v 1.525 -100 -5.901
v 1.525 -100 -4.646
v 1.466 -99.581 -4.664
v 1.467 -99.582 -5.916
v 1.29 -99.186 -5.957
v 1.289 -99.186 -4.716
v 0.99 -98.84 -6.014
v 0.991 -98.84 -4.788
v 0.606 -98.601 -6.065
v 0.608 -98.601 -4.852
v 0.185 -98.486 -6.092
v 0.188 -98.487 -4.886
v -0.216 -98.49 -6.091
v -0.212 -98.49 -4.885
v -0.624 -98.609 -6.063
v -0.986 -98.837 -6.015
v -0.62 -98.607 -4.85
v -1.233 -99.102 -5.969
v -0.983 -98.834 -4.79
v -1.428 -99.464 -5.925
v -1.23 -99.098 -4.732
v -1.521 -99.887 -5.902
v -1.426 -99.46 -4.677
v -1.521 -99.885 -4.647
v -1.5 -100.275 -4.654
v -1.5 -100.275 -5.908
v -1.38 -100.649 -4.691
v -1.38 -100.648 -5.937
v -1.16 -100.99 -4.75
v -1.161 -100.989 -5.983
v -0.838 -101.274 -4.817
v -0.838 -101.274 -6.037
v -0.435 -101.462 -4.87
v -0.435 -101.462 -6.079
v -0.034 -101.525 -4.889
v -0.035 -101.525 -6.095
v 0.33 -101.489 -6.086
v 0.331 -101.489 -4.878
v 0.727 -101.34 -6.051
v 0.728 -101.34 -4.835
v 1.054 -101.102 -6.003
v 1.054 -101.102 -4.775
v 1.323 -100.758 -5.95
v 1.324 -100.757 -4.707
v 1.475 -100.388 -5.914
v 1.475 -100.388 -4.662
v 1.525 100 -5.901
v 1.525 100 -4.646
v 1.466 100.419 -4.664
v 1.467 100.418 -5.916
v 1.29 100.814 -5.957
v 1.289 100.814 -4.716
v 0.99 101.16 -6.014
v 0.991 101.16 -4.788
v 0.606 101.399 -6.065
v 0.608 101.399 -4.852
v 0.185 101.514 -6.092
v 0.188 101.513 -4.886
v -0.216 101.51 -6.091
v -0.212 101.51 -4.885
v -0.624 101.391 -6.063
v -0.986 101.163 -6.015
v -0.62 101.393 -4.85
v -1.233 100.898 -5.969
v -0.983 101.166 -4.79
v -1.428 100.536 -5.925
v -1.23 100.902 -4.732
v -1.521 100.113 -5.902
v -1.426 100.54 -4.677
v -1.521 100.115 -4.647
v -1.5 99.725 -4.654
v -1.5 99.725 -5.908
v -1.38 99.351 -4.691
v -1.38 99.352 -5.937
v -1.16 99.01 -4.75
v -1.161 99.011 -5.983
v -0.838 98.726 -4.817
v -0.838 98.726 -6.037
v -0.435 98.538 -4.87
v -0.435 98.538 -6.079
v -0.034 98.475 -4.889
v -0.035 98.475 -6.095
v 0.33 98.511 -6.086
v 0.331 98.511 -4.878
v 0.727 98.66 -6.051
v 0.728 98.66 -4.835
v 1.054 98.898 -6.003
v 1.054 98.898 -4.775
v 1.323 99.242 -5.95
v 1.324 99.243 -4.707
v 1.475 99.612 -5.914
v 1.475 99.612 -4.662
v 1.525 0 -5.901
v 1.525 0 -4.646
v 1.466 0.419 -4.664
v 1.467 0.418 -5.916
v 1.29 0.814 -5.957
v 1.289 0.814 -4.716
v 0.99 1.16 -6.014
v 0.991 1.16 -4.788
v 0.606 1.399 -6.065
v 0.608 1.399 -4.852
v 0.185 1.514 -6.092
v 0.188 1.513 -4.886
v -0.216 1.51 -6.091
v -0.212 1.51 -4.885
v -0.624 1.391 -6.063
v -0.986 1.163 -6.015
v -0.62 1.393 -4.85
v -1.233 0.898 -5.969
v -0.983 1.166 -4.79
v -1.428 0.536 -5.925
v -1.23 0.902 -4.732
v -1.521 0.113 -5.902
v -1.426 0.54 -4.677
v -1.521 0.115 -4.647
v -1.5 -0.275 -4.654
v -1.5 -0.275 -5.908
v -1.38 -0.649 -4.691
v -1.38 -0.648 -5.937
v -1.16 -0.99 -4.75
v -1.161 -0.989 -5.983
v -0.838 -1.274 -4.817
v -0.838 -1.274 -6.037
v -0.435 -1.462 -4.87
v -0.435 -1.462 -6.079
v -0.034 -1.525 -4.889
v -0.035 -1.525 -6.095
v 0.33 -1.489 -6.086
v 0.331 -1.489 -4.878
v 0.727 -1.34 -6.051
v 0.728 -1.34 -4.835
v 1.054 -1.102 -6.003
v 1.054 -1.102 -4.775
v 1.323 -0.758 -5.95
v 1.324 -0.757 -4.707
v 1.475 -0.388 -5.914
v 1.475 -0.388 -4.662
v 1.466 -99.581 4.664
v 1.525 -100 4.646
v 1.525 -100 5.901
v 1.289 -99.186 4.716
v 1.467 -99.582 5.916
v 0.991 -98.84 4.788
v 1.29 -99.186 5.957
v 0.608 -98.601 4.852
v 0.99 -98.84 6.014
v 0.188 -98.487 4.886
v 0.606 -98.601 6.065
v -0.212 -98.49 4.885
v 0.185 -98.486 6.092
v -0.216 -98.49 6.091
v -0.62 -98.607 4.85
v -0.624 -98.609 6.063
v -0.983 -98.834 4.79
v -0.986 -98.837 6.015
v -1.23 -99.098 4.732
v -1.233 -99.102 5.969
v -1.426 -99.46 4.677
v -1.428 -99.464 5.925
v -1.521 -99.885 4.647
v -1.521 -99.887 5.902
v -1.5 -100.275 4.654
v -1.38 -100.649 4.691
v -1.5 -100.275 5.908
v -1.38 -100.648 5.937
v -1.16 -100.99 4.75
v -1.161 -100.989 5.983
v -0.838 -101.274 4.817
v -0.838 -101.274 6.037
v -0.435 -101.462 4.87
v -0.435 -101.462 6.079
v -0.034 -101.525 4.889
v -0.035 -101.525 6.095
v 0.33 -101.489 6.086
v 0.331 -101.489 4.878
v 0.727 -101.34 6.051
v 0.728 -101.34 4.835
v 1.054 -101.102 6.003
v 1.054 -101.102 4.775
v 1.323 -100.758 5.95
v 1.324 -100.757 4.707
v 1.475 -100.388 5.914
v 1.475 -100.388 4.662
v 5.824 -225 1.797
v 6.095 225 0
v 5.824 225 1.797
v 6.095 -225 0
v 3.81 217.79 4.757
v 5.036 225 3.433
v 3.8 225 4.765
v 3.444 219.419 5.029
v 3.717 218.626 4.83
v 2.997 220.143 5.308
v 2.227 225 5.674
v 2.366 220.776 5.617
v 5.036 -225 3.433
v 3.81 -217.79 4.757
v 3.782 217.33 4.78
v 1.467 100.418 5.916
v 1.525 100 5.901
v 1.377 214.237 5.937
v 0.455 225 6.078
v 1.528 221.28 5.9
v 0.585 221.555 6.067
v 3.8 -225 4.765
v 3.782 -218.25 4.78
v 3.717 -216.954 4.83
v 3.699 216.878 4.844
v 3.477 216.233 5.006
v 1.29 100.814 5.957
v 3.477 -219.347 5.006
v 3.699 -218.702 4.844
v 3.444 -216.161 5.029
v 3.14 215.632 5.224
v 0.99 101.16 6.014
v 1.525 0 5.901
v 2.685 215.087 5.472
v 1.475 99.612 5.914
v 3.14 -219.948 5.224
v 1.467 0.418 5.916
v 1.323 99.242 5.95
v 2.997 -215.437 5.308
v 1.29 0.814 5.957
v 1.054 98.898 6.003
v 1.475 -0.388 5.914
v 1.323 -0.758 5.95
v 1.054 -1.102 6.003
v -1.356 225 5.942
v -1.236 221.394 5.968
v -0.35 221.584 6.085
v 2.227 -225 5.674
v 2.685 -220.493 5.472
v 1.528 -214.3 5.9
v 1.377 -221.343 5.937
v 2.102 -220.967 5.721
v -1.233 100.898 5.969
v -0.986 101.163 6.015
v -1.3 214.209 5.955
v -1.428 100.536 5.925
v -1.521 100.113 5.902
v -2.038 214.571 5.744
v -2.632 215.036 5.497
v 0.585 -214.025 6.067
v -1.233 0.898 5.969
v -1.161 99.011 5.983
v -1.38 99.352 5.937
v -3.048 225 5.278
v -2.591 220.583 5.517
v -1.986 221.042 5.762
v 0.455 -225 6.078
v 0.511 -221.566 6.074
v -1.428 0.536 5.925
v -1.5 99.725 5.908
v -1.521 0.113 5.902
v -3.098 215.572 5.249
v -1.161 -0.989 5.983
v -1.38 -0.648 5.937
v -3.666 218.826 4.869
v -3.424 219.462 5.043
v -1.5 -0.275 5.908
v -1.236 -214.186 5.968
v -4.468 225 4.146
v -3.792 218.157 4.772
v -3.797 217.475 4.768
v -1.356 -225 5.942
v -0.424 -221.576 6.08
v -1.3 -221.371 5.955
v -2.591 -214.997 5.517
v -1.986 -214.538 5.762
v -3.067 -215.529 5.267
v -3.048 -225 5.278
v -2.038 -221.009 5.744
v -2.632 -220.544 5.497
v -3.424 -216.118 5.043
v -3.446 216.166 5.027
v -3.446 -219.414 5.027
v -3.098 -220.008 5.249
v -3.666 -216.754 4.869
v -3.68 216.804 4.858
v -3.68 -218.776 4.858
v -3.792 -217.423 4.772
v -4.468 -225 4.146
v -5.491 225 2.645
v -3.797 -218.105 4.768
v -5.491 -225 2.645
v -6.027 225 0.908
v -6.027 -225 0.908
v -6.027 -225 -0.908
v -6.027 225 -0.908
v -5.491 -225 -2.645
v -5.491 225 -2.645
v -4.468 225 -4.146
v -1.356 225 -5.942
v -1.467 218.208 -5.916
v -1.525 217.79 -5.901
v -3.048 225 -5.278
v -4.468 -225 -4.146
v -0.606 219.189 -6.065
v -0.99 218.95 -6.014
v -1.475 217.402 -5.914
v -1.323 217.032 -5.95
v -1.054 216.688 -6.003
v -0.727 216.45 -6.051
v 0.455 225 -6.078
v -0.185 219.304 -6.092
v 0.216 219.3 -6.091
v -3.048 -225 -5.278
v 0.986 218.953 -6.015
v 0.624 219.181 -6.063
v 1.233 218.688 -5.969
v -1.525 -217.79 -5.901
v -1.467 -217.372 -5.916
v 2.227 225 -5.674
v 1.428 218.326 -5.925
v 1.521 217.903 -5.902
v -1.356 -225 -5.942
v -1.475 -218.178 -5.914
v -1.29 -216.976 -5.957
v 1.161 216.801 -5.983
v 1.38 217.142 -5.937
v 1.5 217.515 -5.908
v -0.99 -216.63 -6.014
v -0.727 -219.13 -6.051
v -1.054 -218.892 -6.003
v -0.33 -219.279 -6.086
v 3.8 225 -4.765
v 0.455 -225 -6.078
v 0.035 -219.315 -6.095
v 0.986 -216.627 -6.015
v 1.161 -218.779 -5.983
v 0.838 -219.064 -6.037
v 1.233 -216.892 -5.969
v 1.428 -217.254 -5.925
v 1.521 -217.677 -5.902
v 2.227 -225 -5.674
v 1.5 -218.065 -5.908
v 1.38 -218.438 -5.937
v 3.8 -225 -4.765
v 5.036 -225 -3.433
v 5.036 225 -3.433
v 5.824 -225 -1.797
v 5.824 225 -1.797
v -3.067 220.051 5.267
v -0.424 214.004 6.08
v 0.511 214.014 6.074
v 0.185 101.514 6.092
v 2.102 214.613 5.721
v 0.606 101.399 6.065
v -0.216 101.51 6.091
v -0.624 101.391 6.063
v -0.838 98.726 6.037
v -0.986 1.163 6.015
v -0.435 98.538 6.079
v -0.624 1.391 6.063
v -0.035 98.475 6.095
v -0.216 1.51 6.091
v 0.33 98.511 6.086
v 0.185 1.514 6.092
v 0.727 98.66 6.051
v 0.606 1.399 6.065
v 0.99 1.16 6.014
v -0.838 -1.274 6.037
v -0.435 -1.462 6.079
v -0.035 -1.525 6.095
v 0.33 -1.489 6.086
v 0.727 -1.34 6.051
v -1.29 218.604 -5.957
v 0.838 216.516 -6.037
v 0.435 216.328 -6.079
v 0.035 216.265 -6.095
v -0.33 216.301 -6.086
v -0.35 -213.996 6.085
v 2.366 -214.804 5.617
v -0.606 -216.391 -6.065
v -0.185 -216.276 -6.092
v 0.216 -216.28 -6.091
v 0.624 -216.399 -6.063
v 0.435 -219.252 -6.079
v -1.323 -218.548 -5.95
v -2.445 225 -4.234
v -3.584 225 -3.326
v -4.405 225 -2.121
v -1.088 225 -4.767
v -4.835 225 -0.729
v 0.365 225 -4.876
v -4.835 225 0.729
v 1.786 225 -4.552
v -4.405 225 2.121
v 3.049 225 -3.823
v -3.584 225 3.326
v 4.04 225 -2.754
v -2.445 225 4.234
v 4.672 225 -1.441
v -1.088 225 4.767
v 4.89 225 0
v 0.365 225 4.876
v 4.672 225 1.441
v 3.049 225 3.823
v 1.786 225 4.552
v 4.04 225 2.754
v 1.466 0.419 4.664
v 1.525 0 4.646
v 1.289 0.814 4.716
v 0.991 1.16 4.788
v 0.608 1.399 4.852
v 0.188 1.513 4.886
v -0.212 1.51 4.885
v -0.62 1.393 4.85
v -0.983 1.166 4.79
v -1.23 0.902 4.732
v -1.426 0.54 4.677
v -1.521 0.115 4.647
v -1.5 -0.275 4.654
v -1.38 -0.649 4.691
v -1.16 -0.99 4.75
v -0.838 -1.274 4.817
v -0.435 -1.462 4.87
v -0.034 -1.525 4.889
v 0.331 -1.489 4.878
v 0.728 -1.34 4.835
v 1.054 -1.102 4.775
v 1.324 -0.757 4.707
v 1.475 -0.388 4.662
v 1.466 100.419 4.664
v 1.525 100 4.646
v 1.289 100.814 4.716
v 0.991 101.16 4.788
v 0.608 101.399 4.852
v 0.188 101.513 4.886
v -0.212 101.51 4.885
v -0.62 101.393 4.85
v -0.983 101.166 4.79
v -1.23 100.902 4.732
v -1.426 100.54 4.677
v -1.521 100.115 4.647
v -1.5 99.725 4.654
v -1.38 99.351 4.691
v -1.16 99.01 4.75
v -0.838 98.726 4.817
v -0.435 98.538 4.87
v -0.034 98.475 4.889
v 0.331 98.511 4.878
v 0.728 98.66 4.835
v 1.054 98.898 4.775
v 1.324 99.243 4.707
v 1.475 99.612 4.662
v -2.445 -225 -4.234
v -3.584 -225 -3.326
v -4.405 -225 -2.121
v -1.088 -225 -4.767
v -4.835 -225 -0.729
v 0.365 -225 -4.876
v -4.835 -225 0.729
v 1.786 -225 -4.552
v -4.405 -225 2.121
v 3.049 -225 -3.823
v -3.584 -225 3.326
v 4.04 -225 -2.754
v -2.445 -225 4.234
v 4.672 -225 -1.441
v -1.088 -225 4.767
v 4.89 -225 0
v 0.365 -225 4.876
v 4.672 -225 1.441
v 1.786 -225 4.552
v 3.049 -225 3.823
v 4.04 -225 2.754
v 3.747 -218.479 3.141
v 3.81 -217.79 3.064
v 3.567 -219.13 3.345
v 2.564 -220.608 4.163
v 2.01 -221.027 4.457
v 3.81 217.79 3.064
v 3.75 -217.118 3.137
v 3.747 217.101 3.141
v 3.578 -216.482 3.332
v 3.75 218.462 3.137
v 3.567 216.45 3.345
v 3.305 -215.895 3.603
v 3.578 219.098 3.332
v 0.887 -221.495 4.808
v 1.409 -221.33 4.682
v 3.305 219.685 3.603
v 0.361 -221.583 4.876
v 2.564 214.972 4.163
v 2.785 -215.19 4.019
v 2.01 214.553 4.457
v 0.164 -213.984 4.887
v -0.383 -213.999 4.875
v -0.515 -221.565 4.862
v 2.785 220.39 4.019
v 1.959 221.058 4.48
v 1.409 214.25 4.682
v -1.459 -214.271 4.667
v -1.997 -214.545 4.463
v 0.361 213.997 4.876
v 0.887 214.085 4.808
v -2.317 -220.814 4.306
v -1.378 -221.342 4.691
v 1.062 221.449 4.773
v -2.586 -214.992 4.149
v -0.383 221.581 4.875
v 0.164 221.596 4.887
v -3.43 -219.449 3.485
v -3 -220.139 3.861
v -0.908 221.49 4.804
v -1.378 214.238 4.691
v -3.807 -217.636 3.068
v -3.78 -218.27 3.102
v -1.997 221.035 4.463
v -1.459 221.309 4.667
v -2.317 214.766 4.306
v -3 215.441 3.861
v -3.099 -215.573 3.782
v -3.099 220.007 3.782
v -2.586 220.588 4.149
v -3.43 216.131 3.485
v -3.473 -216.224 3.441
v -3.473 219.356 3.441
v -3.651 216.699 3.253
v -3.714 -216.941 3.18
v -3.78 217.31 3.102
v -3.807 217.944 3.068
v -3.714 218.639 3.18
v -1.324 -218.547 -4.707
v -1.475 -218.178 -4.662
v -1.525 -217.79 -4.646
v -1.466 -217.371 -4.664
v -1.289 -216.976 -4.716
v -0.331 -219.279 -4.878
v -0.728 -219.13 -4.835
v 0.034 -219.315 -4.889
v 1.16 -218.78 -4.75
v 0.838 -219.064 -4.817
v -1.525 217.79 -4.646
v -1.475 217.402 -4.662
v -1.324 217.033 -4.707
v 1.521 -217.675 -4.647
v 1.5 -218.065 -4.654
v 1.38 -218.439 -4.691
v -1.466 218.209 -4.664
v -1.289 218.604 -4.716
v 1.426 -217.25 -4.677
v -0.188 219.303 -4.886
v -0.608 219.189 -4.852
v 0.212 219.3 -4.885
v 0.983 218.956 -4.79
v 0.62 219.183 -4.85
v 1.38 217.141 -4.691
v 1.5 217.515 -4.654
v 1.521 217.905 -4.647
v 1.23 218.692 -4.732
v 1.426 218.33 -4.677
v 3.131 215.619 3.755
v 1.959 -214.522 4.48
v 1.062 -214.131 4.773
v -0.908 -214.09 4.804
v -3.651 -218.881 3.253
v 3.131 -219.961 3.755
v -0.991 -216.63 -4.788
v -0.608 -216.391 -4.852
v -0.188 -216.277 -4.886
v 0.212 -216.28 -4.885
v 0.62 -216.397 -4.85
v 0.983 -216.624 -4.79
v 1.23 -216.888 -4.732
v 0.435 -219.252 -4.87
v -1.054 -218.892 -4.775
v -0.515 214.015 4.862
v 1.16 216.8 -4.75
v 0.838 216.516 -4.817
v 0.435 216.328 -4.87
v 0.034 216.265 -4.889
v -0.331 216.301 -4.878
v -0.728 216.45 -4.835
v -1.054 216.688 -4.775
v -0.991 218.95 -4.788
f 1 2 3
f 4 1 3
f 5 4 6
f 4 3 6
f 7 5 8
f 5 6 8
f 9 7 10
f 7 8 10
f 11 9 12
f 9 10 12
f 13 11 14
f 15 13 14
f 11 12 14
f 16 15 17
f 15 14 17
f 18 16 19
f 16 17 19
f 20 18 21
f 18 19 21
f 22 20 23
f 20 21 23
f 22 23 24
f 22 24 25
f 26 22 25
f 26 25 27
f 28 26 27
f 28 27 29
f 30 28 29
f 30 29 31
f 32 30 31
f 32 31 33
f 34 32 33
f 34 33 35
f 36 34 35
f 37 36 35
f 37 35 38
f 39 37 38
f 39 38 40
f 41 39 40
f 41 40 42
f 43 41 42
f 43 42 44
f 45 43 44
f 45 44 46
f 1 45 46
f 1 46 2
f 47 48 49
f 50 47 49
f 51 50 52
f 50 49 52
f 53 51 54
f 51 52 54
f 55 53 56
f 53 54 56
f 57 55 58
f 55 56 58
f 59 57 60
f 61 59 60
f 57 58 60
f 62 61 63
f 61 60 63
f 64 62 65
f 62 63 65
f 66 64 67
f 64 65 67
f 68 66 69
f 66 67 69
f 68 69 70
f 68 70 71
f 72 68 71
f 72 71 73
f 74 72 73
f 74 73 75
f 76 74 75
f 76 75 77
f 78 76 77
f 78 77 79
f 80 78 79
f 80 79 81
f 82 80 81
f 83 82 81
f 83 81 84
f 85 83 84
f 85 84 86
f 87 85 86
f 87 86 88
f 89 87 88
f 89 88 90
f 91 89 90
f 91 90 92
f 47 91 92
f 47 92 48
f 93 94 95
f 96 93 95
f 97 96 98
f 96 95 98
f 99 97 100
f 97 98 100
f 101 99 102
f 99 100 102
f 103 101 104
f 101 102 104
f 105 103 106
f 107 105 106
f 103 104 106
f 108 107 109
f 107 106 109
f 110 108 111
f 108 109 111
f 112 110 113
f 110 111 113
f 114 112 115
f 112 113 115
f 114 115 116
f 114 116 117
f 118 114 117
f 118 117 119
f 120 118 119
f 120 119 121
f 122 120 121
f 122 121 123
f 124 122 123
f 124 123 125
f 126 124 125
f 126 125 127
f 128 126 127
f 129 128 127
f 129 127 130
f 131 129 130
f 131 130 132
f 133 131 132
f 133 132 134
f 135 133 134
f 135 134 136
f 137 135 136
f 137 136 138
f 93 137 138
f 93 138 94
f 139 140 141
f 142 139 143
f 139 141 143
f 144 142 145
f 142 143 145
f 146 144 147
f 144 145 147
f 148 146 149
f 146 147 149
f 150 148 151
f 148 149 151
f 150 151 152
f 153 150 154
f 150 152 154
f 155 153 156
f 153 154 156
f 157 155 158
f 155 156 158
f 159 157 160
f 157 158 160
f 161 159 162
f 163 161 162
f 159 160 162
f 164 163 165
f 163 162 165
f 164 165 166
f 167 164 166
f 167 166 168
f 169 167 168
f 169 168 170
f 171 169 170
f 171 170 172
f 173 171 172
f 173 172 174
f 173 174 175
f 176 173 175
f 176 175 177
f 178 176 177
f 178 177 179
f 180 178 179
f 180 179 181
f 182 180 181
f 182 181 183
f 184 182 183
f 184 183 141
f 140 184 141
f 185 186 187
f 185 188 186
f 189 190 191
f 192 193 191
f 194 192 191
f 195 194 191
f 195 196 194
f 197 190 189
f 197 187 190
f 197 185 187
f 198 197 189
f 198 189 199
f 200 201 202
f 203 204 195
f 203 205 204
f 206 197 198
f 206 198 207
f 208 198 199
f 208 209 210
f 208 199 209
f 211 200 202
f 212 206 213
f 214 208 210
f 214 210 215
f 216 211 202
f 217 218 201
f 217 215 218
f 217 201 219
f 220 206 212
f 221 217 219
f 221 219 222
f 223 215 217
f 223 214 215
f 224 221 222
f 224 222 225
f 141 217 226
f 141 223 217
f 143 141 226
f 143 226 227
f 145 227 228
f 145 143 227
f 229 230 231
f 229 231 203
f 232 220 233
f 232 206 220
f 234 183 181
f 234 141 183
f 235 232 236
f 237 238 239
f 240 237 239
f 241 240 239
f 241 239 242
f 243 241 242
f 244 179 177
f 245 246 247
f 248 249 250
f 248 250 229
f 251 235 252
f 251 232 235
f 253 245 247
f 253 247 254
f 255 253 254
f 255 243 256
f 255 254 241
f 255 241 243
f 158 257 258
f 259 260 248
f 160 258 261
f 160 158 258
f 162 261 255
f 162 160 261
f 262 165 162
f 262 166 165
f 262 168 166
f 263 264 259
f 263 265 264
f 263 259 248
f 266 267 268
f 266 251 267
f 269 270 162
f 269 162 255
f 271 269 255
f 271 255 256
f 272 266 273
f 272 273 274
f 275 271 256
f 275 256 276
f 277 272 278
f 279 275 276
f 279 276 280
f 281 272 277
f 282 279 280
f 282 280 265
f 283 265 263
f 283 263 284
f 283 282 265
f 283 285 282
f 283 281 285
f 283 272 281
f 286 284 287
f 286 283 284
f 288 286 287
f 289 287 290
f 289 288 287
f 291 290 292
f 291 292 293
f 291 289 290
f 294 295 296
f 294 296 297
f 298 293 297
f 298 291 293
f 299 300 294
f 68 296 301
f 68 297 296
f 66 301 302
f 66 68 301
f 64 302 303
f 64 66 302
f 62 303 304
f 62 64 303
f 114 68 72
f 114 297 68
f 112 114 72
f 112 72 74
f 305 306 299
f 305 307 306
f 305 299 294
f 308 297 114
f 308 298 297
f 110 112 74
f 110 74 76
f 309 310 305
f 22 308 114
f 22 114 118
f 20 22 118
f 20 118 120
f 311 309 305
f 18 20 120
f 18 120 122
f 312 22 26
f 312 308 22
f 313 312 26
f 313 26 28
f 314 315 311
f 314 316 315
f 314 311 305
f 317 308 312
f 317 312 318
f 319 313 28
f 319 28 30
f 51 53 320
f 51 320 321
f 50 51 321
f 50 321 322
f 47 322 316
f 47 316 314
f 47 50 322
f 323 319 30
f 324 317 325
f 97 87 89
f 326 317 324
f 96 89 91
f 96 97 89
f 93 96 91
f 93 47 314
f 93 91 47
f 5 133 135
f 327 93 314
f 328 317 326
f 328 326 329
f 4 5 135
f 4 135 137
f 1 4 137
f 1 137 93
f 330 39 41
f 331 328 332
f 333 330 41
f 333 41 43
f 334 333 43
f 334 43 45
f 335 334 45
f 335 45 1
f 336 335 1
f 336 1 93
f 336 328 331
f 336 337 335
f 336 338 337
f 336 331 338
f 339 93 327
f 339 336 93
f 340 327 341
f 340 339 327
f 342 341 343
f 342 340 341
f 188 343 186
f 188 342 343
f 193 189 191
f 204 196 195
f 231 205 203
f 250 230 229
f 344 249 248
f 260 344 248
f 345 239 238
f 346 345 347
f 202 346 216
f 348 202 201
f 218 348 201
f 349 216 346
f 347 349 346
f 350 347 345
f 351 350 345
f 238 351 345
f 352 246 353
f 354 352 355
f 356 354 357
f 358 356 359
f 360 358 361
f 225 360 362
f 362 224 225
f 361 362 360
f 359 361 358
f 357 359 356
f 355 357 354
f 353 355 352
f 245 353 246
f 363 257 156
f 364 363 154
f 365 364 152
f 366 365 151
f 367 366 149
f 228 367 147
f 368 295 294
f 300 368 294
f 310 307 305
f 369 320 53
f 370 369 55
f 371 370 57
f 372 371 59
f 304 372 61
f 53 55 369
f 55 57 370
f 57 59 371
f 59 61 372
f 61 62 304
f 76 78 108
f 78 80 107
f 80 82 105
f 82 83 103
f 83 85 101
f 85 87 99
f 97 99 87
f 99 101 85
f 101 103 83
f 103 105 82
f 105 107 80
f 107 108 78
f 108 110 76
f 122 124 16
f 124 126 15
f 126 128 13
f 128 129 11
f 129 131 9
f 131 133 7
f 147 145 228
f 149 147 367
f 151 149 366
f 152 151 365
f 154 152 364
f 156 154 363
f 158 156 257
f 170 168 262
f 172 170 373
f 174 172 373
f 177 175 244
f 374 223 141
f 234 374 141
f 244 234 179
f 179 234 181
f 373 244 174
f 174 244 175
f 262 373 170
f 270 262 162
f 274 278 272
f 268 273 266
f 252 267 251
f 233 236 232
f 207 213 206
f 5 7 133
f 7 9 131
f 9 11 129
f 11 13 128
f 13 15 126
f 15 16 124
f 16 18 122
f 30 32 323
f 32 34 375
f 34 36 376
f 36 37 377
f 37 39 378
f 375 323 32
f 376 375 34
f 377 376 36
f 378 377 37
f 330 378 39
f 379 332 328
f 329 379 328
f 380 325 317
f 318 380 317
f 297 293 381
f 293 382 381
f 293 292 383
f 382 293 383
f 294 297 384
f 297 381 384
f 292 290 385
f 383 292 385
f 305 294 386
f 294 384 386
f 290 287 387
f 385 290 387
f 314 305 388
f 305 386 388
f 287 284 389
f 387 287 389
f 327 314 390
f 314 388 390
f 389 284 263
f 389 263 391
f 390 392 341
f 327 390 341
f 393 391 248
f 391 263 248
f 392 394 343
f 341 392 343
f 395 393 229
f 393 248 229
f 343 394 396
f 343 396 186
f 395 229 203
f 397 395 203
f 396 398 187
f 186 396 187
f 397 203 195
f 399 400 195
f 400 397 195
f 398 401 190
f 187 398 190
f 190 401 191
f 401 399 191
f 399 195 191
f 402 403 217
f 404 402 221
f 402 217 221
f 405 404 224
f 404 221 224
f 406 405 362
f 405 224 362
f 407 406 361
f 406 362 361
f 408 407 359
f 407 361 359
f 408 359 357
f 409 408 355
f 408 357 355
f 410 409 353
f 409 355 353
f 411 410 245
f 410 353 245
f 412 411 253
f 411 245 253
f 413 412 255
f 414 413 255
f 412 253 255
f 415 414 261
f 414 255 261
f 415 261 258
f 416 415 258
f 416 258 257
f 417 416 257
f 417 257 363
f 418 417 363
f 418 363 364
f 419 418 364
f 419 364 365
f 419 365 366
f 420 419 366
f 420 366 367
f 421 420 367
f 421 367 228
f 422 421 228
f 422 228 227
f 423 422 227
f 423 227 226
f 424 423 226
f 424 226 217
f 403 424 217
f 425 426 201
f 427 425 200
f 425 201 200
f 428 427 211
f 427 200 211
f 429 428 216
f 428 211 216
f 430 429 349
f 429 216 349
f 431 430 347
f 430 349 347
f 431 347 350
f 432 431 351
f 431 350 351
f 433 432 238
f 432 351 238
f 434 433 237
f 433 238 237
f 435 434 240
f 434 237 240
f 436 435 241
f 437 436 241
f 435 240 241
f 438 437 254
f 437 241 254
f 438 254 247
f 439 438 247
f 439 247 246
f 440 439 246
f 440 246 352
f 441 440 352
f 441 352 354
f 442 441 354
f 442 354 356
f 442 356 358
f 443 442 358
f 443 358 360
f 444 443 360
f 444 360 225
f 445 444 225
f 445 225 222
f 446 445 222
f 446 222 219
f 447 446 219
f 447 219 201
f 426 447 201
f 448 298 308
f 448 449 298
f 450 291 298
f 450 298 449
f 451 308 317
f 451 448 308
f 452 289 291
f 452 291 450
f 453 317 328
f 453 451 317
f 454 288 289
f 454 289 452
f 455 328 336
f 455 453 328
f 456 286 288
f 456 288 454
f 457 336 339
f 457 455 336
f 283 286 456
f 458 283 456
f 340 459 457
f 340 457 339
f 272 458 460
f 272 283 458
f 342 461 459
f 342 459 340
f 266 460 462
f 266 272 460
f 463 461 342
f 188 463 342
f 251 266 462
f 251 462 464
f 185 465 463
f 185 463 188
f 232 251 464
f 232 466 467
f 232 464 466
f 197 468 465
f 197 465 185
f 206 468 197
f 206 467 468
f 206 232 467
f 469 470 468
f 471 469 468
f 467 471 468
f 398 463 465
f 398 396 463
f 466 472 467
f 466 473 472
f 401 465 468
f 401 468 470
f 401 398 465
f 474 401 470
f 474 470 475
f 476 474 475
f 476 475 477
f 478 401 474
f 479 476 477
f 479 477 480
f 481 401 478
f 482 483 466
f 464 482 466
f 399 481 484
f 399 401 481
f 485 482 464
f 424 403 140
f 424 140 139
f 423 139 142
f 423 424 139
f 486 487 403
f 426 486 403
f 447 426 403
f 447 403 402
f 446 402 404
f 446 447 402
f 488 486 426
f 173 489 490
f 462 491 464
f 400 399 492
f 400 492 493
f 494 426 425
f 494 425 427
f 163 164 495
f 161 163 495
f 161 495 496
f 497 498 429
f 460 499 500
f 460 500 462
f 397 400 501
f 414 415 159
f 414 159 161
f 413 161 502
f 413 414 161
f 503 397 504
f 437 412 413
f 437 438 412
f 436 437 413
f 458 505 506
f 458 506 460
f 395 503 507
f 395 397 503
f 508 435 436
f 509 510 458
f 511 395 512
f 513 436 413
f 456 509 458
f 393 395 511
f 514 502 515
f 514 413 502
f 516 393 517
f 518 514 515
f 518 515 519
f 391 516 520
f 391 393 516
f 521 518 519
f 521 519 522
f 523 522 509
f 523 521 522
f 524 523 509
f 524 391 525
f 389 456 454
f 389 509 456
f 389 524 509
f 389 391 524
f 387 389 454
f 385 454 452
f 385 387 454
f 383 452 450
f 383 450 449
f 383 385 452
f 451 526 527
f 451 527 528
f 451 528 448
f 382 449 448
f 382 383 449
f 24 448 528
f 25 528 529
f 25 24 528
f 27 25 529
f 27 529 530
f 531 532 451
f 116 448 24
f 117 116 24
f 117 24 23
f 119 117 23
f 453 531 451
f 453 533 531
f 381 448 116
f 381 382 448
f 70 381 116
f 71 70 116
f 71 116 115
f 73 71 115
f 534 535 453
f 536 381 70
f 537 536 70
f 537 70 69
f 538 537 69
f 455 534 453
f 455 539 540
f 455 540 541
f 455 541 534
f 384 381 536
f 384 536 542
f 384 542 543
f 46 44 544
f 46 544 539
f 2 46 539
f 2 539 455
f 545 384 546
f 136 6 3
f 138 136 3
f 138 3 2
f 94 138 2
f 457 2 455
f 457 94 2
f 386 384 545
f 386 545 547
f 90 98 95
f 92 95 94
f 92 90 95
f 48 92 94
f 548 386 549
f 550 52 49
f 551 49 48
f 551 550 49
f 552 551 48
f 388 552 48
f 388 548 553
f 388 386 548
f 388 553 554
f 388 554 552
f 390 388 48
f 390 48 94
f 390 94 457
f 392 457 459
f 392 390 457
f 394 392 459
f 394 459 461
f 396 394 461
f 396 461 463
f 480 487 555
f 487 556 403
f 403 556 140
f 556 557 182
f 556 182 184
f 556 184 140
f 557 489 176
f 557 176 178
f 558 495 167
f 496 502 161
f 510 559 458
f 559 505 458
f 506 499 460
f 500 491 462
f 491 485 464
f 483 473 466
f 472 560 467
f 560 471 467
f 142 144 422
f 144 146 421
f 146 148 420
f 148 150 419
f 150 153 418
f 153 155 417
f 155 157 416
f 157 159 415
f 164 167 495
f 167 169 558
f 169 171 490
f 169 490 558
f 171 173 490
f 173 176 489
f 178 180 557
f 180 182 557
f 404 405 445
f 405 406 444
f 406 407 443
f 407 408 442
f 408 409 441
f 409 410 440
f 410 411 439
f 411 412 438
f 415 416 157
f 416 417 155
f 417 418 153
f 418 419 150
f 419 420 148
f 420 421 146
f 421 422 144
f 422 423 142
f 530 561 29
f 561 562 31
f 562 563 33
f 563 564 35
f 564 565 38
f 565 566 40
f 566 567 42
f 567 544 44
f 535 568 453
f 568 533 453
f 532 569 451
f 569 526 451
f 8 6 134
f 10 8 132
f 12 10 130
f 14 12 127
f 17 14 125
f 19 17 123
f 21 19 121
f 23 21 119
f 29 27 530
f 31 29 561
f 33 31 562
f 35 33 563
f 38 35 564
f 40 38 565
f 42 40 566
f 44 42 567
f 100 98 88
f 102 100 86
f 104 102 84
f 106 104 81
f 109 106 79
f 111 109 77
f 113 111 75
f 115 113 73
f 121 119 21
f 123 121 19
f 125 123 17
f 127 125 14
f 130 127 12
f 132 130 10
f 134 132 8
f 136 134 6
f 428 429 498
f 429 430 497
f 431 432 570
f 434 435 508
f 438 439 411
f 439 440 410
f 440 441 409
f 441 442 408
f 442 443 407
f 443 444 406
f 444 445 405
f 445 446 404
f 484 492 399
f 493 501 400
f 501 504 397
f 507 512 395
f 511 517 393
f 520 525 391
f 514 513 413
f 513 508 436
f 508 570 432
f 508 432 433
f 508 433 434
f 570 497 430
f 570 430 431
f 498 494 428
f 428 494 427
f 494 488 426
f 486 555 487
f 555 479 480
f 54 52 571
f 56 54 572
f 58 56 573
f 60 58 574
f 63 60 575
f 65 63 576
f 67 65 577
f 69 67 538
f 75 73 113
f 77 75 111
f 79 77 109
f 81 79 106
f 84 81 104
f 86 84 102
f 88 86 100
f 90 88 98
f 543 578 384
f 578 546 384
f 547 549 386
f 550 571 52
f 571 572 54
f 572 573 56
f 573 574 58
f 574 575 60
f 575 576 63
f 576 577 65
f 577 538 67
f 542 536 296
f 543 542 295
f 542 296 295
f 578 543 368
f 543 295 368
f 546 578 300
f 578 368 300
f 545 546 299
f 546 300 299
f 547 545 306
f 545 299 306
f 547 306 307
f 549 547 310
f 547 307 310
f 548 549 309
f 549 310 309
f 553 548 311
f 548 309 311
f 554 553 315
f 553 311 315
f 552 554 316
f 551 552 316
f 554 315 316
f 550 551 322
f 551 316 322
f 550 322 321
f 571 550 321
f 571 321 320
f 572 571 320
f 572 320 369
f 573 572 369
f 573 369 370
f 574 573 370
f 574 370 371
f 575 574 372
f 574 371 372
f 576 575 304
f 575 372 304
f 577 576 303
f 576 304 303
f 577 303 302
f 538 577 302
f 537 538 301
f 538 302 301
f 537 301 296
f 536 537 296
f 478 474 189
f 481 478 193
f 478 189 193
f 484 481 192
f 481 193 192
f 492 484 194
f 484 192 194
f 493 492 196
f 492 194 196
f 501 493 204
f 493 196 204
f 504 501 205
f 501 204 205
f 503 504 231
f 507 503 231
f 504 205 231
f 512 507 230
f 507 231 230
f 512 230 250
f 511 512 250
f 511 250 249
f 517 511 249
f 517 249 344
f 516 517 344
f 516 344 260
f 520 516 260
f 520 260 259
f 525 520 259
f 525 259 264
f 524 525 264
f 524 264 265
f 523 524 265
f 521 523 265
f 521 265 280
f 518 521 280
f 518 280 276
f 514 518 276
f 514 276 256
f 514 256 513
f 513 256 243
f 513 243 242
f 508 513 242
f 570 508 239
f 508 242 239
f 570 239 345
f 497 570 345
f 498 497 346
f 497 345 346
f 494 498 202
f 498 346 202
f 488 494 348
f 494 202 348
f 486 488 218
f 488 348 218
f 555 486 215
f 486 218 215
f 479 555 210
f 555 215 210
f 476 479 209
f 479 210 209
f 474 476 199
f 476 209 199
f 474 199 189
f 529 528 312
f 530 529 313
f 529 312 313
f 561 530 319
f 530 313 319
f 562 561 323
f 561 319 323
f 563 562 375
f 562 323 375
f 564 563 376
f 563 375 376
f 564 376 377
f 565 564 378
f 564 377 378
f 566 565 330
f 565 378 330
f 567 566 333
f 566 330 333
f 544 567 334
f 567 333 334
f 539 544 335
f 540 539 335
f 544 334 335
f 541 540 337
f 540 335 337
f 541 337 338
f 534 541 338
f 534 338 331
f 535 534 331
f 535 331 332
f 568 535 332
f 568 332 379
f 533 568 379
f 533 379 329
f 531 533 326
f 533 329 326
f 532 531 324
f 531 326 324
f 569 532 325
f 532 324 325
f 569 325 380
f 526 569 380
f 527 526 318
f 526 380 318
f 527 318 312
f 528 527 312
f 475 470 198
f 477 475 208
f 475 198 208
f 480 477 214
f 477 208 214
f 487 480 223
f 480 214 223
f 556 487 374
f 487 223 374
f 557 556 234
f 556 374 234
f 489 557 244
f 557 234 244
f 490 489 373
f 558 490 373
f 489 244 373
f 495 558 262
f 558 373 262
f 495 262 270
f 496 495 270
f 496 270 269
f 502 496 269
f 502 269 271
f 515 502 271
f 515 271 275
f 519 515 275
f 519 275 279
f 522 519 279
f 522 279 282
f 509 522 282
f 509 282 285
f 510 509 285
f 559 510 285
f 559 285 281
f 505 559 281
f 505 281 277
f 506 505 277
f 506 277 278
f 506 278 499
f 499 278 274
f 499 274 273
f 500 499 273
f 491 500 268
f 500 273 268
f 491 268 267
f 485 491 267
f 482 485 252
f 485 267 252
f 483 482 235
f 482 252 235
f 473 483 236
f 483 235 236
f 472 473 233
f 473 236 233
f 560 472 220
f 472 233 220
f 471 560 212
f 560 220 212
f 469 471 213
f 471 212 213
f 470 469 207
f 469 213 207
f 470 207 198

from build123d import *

# Parameters (mm, degrees)
SKETCH_R         = 6.095
SKETCH_R_2       = 4.8895
PAD_DEPTH        = 225
HOLE_D           = 3.05
HOLE_DEPTH       = 25
HOLE_CBORE_D     = 7.62
HOLE_CBORE_DEPTH = 5
SKETCH002_R      = 1.525
HOLE001_DEPTH    = 25


with BuildPart() as part:
    # Sketch → Pad (new body, symmetric)
    with BuildSketch(Plane.XZ):
        Circle(SKETCH_R)
        Circle(SKETCH_R_2, mode=Mode.SUBTRACT)
    extrude(amount=PAD_DEPTH, both=True)

    # Hole
    with Locations(Plane.XY.offset(7)):
        with Locations((0, -217.79), (0, 217.79)):
            CounterBoreHole(HOLE_D / 2, HOLE_CBORE_D / 2, HOLE_CBORE_DEPTH, depth=HOLE_DEPTH)

    # Sketch002 → Hole001 (cut)
    with BuildSketch(Plane.XY.offset(7)):
        Circle(SKETCH002_R)
        with Locations((0, -100)):
            Circle(SKETCH002_R)
        with Locations((0, 100)):
            Circle(SKETCH002_R)
    extrude(amount=-HOLE001_DEPTH, mode=Mode.SUBTRACT)


solid = part.part
